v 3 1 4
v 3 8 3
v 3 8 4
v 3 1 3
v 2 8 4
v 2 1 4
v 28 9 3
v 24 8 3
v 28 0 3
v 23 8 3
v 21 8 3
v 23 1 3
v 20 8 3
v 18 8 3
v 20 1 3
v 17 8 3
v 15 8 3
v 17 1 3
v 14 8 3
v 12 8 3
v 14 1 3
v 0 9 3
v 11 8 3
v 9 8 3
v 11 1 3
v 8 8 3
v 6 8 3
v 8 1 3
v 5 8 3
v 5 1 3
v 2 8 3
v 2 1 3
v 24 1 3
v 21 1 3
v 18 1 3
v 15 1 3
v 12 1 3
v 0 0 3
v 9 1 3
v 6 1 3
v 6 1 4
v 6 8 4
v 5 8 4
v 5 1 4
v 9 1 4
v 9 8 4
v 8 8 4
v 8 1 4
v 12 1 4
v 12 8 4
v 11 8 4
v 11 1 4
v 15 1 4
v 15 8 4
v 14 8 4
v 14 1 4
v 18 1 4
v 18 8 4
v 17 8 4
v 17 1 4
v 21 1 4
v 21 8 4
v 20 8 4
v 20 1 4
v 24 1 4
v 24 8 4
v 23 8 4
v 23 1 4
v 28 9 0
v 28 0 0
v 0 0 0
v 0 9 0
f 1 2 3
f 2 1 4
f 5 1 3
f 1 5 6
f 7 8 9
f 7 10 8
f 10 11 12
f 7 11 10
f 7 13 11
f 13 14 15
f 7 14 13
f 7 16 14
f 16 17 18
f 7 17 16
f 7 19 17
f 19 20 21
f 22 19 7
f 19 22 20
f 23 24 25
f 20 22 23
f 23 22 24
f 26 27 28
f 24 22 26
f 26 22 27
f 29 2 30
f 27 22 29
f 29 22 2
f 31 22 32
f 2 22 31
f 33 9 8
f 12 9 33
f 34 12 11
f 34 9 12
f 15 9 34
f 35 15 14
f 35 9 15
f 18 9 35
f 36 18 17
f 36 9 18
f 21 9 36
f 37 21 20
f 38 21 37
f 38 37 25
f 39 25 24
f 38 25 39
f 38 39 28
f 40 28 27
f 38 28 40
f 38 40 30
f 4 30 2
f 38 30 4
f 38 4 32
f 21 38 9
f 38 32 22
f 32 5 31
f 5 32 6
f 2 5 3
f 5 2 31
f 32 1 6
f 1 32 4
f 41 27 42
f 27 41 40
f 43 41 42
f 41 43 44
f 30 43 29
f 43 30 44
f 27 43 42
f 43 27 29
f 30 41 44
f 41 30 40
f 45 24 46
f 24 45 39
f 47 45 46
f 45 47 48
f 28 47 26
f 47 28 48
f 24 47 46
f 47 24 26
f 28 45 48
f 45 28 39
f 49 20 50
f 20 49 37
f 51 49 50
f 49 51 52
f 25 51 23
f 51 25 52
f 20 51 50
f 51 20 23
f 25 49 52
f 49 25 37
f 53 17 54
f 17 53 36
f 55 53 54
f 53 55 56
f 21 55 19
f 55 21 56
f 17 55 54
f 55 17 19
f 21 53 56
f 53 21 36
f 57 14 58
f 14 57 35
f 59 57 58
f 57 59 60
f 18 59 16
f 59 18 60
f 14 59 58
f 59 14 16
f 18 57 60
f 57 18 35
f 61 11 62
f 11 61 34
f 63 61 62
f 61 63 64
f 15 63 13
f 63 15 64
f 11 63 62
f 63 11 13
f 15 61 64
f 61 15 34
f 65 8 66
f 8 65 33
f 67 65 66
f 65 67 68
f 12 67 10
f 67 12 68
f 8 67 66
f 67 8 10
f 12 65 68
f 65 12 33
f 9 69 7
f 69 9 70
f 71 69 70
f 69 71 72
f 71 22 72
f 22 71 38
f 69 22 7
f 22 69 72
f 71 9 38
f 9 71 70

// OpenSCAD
// Concept only. Provisional dimensions in mm.
$fn=32;
cube([28,9,3]);for(x=[2:3:25])translate([x,1,3])cube([1,7,1]);
